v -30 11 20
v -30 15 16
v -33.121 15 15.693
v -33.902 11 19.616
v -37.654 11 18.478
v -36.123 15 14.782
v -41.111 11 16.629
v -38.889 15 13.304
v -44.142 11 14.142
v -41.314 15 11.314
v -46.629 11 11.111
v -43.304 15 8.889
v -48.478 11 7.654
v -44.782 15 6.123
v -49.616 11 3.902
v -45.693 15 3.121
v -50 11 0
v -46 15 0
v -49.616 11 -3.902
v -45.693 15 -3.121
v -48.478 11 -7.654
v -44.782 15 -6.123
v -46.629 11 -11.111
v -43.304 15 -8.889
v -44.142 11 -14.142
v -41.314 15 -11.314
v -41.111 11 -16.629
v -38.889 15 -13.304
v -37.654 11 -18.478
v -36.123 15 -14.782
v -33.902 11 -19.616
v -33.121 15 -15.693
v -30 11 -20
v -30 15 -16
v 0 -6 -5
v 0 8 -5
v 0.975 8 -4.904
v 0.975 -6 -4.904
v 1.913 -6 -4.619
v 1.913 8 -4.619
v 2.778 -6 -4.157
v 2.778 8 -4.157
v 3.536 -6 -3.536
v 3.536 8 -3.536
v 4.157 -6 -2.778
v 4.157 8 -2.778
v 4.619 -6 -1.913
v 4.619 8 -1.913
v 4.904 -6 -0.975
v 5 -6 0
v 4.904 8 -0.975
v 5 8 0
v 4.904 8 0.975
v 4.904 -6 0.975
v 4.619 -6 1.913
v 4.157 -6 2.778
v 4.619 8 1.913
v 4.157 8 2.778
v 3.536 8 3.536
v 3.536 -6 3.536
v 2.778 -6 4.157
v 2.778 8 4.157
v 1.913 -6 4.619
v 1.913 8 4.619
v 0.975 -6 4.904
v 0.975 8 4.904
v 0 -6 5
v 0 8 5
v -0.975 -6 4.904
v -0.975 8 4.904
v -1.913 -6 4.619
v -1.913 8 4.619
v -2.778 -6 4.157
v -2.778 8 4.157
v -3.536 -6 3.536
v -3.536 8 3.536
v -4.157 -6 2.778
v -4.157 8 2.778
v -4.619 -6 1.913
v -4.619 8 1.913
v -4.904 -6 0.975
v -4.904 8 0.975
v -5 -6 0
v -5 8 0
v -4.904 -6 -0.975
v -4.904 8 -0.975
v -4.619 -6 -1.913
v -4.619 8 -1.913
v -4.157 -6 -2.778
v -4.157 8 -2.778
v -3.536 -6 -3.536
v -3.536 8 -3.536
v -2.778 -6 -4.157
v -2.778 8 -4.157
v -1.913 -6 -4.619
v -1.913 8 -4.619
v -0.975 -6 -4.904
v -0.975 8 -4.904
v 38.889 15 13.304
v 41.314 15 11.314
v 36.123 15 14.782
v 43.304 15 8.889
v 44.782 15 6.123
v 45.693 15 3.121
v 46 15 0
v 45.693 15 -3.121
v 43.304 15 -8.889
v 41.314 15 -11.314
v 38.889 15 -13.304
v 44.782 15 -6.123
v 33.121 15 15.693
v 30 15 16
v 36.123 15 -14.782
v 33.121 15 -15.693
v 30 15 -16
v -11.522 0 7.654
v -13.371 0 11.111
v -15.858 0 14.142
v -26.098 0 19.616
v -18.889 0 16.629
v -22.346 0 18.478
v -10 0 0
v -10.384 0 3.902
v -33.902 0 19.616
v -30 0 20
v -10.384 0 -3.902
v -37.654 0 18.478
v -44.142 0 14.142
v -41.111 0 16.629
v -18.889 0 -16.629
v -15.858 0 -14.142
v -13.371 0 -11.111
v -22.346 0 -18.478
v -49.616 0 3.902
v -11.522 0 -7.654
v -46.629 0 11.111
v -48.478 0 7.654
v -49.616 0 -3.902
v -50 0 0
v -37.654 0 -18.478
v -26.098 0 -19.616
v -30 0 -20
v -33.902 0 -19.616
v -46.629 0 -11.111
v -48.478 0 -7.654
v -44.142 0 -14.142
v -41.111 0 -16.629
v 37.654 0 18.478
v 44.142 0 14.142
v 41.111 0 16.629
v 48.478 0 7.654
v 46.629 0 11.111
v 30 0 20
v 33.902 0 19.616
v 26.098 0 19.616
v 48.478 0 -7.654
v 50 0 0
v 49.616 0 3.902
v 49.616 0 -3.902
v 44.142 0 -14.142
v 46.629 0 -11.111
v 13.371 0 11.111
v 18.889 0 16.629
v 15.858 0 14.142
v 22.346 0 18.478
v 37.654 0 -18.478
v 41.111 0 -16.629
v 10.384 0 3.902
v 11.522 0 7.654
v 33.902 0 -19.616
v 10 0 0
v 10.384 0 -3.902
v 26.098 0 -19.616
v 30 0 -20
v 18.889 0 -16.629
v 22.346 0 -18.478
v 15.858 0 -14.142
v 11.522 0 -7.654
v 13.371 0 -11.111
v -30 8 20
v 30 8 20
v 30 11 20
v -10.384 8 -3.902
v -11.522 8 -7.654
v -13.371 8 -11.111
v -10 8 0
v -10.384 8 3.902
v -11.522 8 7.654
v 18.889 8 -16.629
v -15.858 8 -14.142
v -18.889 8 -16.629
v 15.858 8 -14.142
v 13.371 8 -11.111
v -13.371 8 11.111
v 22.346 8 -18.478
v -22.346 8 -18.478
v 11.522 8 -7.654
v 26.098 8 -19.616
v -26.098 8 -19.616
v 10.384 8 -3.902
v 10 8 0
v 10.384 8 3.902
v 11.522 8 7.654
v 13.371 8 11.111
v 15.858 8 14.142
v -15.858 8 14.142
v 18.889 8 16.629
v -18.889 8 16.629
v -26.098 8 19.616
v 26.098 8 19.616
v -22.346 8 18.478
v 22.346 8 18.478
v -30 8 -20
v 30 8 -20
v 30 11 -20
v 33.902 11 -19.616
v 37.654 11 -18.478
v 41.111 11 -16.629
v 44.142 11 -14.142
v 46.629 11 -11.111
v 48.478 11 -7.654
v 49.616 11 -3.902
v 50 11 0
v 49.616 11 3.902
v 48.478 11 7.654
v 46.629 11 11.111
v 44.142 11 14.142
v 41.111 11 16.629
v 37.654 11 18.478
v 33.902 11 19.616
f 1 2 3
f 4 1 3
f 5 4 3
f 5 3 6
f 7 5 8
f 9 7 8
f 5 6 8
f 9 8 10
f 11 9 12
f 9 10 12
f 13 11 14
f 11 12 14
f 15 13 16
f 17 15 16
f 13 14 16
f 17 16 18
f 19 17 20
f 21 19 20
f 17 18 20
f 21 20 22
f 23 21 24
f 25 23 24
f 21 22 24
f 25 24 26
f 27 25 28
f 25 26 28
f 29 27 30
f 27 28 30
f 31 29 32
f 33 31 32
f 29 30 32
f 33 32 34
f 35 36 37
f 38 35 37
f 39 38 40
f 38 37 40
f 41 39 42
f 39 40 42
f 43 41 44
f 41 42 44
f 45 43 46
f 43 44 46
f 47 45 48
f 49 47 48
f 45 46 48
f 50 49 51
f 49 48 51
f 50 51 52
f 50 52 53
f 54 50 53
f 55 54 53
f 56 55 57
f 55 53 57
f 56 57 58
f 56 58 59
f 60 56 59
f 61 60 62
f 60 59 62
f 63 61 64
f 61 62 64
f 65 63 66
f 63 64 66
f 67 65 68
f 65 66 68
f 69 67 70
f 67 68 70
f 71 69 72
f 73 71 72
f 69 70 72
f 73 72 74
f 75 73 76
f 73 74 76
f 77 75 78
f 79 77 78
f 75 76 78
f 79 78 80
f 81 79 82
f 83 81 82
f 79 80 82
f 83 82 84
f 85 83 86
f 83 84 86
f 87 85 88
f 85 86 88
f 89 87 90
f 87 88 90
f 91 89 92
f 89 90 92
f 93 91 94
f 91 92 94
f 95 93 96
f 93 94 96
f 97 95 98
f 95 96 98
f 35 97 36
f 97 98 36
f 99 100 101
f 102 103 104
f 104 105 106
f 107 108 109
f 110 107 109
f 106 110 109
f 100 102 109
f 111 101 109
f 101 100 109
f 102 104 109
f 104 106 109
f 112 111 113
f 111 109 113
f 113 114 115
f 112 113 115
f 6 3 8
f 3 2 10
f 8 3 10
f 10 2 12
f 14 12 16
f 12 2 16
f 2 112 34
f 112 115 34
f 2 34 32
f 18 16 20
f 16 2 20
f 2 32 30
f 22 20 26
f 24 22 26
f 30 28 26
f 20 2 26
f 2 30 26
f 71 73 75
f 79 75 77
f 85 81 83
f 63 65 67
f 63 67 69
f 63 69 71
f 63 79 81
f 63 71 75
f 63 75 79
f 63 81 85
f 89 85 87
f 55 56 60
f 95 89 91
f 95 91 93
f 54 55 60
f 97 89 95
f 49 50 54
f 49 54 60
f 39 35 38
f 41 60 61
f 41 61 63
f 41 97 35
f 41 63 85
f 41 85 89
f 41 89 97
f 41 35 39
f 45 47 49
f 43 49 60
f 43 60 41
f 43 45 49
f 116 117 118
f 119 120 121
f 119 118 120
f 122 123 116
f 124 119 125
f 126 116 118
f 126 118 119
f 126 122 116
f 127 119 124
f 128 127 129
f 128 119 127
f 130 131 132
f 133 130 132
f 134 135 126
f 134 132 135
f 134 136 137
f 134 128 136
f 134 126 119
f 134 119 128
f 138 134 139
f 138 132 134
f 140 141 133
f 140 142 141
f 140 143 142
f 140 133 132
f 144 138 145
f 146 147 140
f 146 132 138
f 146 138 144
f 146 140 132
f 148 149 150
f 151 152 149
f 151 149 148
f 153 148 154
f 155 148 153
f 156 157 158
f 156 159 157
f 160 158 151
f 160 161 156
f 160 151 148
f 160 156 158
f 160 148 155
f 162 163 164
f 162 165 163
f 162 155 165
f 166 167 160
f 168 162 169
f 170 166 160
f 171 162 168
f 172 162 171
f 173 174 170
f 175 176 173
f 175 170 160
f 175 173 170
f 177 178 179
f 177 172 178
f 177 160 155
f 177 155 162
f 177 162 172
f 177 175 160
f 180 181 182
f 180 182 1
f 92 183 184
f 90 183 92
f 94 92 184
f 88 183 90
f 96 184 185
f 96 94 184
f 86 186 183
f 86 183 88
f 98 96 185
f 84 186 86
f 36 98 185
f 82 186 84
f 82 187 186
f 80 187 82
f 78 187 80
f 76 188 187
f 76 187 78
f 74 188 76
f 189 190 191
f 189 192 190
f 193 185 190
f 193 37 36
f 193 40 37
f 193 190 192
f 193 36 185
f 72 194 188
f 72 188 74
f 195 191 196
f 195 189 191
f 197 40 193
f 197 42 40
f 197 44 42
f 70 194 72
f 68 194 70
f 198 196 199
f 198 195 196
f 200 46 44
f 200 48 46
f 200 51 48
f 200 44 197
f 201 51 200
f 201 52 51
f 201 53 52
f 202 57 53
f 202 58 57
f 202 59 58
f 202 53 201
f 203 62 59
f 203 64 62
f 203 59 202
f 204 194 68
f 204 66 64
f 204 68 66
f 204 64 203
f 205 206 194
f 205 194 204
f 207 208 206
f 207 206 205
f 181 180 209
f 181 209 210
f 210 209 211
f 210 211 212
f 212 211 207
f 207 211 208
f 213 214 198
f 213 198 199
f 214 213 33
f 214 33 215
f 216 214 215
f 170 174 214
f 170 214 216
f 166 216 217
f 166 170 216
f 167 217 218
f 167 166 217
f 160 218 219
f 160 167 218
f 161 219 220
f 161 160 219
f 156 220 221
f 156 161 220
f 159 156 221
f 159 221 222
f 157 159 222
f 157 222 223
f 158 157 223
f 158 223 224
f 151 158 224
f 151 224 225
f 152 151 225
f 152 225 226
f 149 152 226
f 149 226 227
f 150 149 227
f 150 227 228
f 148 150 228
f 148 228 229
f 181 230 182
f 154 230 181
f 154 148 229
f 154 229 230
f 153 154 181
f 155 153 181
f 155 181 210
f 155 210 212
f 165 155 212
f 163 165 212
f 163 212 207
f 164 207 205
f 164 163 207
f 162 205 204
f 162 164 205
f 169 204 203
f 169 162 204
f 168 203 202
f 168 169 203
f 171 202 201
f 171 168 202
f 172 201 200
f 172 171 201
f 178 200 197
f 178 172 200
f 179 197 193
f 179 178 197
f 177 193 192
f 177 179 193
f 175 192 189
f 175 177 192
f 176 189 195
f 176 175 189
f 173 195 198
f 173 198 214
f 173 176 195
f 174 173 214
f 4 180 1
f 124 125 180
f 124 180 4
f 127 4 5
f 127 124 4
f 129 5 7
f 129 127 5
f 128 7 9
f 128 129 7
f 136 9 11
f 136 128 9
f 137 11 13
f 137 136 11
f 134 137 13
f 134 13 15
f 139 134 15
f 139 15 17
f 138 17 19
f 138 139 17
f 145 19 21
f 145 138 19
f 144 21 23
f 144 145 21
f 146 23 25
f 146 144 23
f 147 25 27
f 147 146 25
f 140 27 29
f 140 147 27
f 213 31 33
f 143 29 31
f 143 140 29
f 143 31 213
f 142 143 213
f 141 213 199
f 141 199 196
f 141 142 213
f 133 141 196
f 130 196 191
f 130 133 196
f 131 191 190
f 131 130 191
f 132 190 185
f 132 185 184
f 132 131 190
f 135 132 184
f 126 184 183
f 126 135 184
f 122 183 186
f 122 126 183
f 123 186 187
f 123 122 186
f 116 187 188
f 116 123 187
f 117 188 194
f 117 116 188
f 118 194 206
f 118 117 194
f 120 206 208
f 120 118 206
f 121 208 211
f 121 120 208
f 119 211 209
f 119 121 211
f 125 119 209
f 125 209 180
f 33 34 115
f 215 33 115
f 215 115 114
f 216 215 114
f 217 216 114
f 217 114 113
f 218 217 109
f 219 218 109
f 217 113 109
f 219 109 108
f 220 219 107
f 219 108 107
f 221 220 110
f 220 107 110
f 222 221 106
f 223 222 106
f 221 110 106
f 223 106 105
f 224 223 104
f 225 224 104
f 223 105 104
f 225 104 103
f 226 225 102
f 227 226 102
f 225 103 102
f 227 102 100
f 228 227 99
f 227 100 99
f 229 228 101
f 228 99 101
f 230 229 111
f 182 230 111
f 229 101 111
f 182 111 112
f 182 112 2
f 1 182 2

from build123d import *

# Parameters (mm, degrees)
EXTRUDE_1_DEPTH     = 15
CHAMFER_1_SIZE      = 4
SKETCH_3_OUTSIDE_W  = 123.748
SKETCH_3_OUTSIDE_H  = 63.748
SKETCH_3_OUTSIDE_R  = 20
CUT_EXTRUDE_1_DEPTH = 8
SKETCH_4_R          = 5
EXTRUDE_2_DEPTH     = 14


with BuildPart() as part:
    # 草图1 → 凸台-拉伸1 (new body)
    with BuildSketch(Plane(origin=(0, 0, 0), x_dir=(1, 0, 0), z_dir=(0, 1, 0))):
        with BuildLine():
            Line((30, -20), (-30, -20))
            ThreePointArc((-30, -20), (-50, 0), (-30, 20))
            Line((-30, 20), (30, 20))
            ThreePointArc((30, 20), (50, 0), (30, -20))
        make_face()
    extrude(amount=EXTRUDE_1_DEPTH)

    # 倒角1
    chamfer_1_edges = [part.edges().sort_by_distance(p)[0] for p in [
        (-50, 15, 0),
        (0, 15, 20),
        (50, 15, 0),
        (0, 15, -20),
    ]]
    chamfer(chamfer_1_edges, length=CHAMFER_1_SIZE)

    # 草图3 outside → 切除-拉伸1 (cut)
    with BuildSketch(Plane.XZ):
        Rectangle(SKETCH_3_OUTSIDE_W, SKETCH_3_OUTSIDE_H)
        with Locations(Location((-30, 0, 0), (0, 0, 90))):
            Circle(SKETCH_3_OUTSIDE_R, mode=Mode.SUBTRACT)
        with Locations(Location((30, 0, 0), (0, 0, 90))):
            Circle(SKETCH_3_OUTSIDE_R, mode=Mode.SUBTRACT)
    extrude(amount=-CUT_EXTRUDE_1_DEPTH, mode=Mode.SUBTRACT)

    # 草图4 → 凸台-拉伸2 (add)
    with BuildSketch(Plane.XZ.offset(-8)):
        with Locations(Location((0, 0, 0), (0, 0, 270))):
            Circle(SKETCH_4_R)
    extrude(amount=EXTRUDE_2_DEPTH)


solid = part.part
